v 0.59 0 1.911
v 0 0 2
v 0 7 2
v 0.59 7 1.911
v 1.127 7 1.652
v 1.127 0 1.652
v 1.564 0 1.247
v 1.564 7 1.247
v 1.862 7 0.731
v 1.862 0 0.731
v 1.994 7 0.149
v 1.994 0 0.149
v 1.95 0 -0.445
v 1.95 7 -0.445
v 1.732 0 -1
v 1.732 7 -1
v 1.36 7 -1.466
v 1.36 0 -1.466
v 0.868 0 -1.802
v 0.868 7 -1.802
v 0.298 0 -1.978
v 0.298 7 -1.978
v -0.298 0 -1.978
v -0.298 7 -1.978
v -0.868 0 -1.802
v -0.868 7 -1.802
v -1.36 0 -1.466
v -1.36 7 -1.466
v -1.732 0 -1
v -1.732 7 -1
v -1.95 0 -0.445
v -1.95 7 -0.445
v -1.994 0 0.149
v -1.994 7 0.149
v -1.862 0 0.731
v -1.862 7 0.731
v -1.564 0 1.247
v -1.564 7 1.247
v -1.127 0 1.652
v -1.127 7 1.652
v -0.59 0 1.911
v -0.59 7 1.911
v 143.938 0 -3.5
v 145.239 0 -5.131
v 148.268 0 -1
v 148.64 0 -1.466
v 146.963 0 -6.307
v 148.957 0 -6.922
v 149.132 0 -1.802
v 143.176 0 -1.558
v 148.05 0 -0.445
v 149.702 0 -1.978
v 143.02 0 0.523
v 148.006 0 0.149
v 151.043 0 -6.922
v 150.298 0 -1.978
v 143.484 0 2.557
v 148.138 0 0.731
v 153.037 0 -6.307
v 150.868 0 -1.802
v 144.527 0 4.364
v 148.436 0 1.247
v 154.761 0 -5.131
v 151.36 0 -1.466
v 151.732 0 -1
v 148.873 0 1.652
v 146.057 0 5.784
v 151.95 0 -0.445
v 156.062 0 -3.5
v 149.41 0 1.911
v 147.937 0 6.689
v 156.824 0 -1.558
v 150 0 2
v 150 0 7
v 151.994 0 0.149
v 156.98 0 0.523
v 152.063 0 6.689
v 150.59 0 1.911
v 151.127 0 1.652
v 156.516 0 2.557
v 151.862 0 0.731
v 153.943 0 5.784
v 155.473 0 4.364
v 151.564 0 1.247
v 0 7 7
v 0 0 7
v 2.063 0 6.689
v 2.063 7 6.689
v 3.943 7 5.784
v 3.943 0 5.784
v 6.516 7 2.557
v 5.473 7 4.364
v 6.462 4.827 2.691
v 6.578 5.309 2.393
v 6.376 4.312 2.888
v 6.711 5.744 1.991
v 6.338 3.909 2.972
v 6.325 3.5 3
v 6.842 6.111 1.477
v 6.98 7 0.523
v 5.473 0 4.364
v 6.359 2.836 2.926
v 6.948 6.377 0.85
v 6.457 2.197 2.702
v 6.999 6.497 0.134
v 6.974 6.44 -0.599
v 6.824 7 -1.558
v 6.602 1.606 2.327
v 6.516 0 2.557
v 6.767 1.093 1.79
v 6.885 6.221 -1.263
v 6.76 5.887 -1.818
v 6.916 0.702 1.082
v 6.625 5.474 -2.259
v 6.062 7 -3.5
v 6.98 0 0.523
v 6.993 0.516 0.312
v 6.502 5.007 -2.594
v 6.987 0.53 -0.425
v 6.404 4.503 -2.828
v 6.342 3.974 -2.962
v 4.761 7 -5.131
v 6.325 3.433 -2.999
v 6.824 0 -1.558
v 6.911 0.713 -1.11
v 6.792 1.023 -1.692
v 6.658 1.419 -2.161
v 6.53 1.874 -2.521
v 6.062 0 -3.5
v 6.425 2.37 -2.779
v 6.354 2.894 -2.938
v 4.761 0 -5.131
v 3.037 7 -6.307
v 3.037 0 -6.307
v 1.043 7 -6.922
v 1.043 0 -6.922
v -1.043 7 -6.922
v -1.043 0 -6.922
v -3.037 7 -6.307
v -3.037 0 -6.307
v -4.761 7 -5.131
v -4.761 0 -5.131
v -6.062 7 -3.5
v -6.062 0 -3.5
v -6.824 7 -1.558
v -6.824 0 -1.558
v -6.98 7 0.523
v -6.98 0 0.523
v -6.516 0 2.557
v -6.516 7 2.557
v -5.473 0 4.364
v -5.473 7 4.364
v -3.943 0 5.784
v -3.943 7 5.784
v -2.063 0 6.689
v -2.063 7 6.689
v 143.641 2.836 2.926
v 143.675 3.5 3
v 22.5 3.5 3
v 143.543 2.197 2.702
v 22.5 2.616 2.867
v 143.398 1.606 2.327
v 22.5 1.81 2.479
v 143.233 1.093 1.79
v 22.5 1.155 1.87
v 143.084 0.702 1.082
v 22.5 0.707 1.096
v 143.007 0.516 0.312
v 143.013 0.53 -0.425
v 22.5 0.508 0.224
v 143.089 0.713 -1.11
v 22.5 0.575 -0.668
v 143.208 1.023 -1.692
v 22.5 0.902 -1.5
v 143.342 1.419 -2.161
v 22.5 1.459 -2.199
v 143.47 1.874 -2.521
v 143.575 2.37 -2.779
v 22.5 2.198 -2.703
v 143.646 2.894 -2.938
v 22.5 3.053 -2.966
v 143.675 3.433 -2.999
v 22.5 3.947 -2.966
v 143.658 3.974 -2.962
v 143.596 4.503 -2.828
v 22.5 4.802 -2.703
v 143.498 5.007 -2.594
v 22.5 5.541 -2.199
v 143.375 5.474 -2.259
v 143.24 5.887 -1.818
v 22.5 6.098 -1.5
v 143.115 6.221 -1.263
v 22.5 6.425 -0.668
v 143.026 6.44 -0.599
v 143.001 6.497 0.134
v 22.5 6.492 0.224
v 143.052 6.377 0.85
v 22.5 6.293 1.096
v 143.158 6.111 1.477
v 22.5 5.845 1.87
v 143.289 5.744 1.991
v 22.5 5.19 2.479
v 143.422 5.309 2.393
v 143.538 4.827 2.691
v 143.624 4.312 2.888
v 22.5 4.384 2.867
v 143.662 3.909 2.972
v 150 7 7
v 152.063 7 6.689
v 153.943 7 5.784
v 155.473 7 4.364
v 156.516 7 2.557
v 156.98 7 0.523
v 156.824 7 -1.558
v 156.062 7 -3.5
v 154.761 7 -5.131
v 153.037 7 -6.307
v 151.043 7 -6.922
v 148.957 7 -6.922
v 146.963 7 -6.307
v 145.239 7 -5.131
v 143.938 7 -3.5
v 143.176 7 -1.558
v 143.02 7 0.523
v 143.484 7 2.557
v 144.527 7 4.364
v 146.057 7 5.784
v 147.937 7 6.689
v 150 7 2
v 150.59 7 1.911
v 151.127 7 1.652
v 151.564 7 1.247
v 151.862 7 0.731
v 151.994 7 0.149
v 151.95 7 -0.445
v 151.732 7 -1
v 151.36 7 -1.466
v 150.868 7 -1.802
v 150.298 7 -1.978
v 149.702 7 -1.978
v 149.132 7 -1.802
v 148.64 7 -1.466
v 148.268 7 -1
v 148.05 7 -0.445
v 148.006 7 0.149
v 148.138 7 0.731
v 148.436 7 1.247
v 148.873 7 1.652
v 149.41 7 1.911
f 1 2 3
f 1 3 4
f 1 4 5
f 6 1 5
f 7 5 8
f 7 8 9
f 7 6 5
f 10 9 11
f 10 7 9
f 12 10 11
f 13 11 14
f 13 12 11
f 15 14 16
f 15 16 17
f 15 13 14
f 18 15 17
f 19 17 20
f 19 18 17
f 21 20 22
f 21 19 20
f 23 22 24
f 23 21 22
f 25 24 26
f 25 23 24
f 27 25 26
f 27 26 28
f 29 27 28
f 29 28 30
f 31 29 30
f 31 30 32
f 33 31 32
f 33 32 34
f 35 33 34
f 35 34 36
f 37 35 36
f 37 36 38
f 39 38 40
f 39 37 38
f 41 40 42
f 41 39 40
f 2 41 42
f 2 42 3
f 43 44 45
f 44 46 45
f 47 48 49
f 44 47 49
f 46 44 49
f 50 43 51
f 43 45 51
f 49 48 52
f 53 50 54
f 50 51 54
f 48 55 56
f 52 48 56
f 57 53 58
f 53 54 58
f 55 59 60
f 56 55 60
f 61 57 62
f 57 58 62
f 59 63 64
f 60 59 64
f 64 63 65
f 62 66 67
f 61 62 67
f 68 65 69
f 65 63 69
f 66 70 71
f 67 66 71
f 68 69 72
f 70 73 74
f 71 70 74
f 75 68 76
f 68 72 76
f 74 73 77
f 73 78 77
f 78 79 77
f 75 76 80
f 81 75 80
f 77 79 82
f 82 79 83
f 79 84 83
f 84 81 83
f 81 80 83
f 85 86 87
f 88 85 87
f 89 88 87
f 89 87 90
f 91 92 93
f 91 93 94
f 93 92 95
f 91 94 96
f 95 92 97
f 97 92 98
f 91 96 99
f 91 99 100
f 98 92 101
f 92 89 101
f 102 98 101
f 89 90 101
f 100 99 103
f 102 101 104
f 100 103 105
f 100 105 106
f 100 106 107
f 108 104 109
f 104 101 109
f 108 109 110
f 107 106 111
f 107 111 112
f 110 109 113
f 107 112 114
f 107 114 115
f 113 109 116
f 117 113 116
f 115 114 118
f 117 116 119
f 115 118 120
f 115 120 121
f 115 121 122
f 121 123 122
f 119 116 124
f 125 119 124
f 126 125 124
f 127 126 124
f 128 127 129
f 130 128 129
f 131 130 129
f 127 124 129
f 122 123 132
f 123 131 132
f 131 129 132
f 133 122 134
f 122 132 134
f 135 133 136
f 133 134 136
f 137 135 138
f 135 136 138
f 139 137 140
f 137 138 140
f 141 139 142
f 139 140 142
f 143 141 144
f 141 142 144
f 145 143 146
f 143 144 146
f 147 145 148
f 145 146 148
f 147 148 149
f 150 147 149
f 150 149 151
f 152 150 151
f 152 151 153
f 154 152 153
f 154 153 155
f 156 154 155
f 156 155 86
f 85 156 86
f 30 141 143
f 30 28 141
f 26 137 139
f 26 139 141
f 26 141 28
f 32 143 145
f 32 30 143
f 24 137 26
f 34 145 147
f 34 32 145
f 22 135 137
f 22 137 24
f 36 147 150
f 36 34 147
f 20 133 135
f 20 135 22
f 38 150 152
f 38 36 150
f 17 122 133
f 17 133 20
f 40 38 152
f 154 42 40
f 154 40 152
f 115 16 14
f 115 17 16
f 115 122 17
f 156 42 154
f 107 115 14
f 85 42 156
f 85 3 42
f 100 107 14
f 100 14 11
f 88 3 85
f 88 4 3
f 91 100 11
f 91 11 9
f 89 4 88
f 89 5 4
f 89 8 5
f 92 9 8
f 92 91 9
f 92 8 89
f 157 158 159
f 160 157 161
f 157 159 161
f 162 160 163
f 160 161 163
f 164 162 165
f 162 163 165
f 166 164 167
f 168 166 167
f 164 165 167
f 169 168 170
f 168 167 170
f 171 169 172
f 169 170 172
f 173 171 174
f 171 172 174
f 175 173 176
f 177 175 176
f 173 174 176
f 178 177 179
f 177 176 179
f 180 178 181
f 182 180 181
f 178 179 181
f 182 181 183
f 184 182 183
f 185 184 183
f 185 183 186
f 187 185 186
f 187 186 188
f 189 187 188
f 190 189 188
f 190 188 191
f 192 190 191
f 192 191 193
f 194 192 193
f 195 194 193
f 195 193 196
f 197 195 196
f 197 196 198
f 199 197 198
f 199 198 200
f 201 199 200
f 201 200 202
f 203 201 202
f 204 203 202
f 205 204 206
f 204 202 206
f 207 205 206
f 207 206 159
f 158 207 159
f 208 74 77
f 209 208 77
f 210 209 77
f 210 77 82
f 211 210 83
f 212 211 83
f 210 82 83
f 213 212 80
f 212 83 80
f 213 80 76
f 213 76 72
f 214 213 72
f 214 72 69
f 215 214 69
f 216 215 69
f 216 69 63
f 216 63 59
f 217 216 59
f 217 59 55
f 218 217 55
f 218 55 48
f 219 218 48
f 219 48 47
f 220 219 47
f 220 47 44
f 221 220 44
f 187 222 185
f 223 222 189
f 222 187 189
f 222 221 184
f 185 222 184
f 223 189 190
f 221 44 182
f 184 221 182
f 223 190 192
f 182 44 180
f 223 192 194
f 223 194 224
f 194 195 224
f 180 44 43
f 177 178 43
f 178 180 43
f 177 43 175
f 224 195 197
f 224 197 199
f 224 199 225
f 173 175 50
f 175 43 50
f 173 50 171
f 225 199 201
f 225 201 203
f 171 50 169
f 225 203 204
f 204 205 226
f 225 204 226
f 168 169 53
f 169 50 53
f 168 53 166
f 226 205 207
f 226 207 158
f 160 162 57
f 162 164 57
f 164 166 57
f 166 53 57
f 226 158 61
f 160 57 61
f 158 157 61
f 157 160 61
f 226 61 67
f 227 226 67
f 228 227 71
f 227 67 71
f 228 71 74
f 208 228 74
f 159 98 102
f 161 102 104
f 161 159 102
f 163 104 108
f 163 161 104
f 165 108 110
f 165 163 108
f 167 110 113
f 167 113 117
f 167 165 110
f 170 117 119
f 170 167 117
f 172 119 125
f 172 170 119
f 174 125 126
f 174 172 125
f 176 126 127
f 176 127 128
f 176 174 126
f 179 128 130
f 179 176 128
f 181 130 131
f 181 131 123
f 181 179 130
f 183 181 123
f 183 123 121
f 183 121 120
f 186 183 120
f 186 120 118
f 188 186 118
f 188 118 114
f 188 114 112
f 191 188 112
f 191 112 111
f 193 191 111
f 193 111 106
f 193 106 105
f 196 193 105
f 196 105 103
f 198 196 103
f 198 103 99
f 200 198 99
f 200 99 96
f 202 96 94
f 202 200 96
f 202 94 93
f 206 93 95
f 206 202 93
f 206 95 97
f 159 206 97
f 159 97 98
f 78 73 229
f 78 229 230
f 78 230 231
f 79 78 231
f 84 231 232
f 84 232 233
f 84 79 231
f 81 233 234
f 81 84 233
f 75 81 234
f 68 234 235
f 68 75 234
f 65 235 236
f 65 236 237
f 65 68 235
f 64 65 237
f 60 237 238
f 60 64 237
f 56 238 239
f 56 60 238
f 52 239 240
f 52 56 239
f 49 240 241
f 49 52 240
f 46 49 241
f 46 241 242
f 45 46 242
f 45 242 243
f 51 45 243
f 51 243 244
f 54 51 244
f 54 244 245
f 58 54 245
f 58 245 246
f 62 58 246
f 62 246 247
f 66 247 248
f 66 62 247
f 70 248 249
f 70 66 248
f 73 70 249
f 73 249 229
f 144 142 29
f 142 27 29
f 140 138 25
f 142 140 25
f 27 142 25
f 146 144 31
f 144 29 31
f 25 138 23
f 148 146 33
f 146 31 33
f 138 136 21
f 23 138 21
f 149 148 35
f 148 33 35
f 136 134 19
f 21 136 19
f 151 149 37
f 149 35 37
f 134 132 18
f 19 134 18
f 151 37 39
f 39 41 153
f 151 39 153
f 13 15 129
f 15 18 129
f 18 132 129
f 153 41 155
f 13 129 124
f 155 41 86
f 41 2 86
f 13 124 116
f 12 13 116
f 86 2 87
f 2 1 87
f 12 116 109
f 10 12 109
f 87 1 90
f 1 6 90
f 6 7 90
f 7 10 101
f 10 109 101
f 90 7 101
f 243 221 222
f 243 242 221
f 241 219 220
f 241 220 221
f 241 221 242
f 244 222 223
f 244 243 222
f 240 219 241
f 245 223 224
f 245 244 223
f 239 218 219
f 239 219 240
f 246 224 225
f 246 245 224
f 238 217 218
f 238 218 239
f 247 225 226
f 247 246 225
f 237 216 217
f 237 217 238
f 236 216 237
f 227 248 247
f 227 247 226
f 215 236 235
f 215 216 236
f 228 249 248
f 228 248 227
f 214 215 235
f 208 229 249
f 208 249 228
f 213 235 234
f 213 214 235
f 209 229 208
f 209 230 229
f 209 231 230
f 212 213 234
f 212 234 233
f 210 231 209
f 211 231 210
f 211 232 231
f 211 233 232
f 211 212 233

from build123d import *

# Parameters (mm, degrees)
SKETCH1_R                            = 7
SKETCH1_R_2                          = 2
BOSS_EXTRUDE1_DEPTH                  = 7
BOSS_EXTRUDE1_2_DEPTH                = 7
BOSS_EXTRUDE2_REACH                  = 136.864
BOSS_EXTRUDE2_END_RADIUS             = 7
SKETCH2_R                            = 3
BOSS_EXTRUDE2_DIRECTION_2_REACH      = 136.864
BOSS_EXTRUDE2_DIRECTION_2_END_RADIUS = 7


with BuildPart() as part:
    # Sketch1 → Boss-Extrude1 (new body)
    with BuildSketch(Plane(origin=(0, 0, 0), x_dir=(1, 0, 0), z_dir=(0, 1, 0))):
        with Locations(Location((0, 0, 0), (0, 0, 270))):
            Circle(SKETCH1_R)
        with Locations(Location((0, 0, 0), (0, 0, 270))):
            Circle(SKETCH1_R_2, mode=Mode.SUBTRACT)
    extrude(amount=BOSS_EXTRUDE1_DEPTH)



with BuildPart() as body_2:
    # Sketch1 → Boss-Extrude1 2 (new body)
    with BuildSketch(Plane(origin=(0, 0, 0), x_dir=(1, 0, 0), z_dir=(0, 1, 0))):
        with Locations(Location((150, 0, 0), (0, 0, 270))):
            Circle(SKETCH1_R)
        with Locations(Location((150, 0, 0), (0, 0, 270))):
            Circle(SKETCH1_R_2, mode=Mode.SUBTRACT)
    extrude(amount=BOSS_EXTRUDE1_2_DEPTH)


with BuildPart() as part_1:
    add(part.part)

    add(body_2.part)  # Boss-Extrude2 merges body 2
    # Boss-Extrude2: up to this cylinder (the profile starts outside it)
    boss_extrude2_end = Plane(origin=(150, 3.5, 0), z_dir=(0, -1, 0)) * Cylinder(BOSS_EXTRUDE2_END_RADIUS, 288.728, mode=Mode.PRIVATE)
    # Sketch2 → Boss-Extrude2 (add, up to the surface)
    with BuildSketch(Plane(origin=(22.5, 0, 0), x_dir=(0, 0, -1), z_dir=(1, 0, 0)), mode=Mode.PRIVATE) as boss_extrude2_sk1:
        with Locations(Location((0, 3.5, 0), (0, 0, 180))):
            Circle(SKETCH2_R)
    boss_extrude2_tool1 = extrude(boss_extrude2_sk1.sketch, amount=BOSS_EXTRUDE2_REACH, mode=Mode.PRIVATE) - boss_extrude2_end
    add(boss_extrude2_tool1.solids().sort_by_distance((22.5, 3.5, 0))[0])

    # Boss-Extrude2 direction 2: up to this cylinder (the profile starts outside it)
    boss_extrude2_direction_2_end = Plane(origin=(0, 3.5, 0), z_dir=(0, -1, 0)) * Cylinder(BOSS_EXTRUDE2_DIRECTION_2_END_RADIUS, 288.728, mode=Mode.PRIVATE)
    # Sketch2 → Boss-Extrude2 direction 2 (add, up to the surface)
    with BuildSketch(Plane(origin=(22.5, 0, 0), x_dir=(0, 0, -1), z_dir=(1, 0, 0)), mode=Mode.PRIVATE) as boss_extrude2_direction_2_sk1:
        with Locations(Location((0, 3.5, 0), (0, 0, 180))):
            Circle(SKETCH2_R)
    boss_extrude2_direction_2_tool1 = extrude(boss_extrude2_direction_2_sk1.sketch, amount=-BOSS_EXTRUDE2_DIRECTION_2_REACH, mode=Mode.PRIVATE) - boss_extrude2_direction_2_end
    add(boss_extrude2_direction_2_tool1.solids().sort_by_distance((22.5, 3.5, 0))[0])


solid = part_1.part
